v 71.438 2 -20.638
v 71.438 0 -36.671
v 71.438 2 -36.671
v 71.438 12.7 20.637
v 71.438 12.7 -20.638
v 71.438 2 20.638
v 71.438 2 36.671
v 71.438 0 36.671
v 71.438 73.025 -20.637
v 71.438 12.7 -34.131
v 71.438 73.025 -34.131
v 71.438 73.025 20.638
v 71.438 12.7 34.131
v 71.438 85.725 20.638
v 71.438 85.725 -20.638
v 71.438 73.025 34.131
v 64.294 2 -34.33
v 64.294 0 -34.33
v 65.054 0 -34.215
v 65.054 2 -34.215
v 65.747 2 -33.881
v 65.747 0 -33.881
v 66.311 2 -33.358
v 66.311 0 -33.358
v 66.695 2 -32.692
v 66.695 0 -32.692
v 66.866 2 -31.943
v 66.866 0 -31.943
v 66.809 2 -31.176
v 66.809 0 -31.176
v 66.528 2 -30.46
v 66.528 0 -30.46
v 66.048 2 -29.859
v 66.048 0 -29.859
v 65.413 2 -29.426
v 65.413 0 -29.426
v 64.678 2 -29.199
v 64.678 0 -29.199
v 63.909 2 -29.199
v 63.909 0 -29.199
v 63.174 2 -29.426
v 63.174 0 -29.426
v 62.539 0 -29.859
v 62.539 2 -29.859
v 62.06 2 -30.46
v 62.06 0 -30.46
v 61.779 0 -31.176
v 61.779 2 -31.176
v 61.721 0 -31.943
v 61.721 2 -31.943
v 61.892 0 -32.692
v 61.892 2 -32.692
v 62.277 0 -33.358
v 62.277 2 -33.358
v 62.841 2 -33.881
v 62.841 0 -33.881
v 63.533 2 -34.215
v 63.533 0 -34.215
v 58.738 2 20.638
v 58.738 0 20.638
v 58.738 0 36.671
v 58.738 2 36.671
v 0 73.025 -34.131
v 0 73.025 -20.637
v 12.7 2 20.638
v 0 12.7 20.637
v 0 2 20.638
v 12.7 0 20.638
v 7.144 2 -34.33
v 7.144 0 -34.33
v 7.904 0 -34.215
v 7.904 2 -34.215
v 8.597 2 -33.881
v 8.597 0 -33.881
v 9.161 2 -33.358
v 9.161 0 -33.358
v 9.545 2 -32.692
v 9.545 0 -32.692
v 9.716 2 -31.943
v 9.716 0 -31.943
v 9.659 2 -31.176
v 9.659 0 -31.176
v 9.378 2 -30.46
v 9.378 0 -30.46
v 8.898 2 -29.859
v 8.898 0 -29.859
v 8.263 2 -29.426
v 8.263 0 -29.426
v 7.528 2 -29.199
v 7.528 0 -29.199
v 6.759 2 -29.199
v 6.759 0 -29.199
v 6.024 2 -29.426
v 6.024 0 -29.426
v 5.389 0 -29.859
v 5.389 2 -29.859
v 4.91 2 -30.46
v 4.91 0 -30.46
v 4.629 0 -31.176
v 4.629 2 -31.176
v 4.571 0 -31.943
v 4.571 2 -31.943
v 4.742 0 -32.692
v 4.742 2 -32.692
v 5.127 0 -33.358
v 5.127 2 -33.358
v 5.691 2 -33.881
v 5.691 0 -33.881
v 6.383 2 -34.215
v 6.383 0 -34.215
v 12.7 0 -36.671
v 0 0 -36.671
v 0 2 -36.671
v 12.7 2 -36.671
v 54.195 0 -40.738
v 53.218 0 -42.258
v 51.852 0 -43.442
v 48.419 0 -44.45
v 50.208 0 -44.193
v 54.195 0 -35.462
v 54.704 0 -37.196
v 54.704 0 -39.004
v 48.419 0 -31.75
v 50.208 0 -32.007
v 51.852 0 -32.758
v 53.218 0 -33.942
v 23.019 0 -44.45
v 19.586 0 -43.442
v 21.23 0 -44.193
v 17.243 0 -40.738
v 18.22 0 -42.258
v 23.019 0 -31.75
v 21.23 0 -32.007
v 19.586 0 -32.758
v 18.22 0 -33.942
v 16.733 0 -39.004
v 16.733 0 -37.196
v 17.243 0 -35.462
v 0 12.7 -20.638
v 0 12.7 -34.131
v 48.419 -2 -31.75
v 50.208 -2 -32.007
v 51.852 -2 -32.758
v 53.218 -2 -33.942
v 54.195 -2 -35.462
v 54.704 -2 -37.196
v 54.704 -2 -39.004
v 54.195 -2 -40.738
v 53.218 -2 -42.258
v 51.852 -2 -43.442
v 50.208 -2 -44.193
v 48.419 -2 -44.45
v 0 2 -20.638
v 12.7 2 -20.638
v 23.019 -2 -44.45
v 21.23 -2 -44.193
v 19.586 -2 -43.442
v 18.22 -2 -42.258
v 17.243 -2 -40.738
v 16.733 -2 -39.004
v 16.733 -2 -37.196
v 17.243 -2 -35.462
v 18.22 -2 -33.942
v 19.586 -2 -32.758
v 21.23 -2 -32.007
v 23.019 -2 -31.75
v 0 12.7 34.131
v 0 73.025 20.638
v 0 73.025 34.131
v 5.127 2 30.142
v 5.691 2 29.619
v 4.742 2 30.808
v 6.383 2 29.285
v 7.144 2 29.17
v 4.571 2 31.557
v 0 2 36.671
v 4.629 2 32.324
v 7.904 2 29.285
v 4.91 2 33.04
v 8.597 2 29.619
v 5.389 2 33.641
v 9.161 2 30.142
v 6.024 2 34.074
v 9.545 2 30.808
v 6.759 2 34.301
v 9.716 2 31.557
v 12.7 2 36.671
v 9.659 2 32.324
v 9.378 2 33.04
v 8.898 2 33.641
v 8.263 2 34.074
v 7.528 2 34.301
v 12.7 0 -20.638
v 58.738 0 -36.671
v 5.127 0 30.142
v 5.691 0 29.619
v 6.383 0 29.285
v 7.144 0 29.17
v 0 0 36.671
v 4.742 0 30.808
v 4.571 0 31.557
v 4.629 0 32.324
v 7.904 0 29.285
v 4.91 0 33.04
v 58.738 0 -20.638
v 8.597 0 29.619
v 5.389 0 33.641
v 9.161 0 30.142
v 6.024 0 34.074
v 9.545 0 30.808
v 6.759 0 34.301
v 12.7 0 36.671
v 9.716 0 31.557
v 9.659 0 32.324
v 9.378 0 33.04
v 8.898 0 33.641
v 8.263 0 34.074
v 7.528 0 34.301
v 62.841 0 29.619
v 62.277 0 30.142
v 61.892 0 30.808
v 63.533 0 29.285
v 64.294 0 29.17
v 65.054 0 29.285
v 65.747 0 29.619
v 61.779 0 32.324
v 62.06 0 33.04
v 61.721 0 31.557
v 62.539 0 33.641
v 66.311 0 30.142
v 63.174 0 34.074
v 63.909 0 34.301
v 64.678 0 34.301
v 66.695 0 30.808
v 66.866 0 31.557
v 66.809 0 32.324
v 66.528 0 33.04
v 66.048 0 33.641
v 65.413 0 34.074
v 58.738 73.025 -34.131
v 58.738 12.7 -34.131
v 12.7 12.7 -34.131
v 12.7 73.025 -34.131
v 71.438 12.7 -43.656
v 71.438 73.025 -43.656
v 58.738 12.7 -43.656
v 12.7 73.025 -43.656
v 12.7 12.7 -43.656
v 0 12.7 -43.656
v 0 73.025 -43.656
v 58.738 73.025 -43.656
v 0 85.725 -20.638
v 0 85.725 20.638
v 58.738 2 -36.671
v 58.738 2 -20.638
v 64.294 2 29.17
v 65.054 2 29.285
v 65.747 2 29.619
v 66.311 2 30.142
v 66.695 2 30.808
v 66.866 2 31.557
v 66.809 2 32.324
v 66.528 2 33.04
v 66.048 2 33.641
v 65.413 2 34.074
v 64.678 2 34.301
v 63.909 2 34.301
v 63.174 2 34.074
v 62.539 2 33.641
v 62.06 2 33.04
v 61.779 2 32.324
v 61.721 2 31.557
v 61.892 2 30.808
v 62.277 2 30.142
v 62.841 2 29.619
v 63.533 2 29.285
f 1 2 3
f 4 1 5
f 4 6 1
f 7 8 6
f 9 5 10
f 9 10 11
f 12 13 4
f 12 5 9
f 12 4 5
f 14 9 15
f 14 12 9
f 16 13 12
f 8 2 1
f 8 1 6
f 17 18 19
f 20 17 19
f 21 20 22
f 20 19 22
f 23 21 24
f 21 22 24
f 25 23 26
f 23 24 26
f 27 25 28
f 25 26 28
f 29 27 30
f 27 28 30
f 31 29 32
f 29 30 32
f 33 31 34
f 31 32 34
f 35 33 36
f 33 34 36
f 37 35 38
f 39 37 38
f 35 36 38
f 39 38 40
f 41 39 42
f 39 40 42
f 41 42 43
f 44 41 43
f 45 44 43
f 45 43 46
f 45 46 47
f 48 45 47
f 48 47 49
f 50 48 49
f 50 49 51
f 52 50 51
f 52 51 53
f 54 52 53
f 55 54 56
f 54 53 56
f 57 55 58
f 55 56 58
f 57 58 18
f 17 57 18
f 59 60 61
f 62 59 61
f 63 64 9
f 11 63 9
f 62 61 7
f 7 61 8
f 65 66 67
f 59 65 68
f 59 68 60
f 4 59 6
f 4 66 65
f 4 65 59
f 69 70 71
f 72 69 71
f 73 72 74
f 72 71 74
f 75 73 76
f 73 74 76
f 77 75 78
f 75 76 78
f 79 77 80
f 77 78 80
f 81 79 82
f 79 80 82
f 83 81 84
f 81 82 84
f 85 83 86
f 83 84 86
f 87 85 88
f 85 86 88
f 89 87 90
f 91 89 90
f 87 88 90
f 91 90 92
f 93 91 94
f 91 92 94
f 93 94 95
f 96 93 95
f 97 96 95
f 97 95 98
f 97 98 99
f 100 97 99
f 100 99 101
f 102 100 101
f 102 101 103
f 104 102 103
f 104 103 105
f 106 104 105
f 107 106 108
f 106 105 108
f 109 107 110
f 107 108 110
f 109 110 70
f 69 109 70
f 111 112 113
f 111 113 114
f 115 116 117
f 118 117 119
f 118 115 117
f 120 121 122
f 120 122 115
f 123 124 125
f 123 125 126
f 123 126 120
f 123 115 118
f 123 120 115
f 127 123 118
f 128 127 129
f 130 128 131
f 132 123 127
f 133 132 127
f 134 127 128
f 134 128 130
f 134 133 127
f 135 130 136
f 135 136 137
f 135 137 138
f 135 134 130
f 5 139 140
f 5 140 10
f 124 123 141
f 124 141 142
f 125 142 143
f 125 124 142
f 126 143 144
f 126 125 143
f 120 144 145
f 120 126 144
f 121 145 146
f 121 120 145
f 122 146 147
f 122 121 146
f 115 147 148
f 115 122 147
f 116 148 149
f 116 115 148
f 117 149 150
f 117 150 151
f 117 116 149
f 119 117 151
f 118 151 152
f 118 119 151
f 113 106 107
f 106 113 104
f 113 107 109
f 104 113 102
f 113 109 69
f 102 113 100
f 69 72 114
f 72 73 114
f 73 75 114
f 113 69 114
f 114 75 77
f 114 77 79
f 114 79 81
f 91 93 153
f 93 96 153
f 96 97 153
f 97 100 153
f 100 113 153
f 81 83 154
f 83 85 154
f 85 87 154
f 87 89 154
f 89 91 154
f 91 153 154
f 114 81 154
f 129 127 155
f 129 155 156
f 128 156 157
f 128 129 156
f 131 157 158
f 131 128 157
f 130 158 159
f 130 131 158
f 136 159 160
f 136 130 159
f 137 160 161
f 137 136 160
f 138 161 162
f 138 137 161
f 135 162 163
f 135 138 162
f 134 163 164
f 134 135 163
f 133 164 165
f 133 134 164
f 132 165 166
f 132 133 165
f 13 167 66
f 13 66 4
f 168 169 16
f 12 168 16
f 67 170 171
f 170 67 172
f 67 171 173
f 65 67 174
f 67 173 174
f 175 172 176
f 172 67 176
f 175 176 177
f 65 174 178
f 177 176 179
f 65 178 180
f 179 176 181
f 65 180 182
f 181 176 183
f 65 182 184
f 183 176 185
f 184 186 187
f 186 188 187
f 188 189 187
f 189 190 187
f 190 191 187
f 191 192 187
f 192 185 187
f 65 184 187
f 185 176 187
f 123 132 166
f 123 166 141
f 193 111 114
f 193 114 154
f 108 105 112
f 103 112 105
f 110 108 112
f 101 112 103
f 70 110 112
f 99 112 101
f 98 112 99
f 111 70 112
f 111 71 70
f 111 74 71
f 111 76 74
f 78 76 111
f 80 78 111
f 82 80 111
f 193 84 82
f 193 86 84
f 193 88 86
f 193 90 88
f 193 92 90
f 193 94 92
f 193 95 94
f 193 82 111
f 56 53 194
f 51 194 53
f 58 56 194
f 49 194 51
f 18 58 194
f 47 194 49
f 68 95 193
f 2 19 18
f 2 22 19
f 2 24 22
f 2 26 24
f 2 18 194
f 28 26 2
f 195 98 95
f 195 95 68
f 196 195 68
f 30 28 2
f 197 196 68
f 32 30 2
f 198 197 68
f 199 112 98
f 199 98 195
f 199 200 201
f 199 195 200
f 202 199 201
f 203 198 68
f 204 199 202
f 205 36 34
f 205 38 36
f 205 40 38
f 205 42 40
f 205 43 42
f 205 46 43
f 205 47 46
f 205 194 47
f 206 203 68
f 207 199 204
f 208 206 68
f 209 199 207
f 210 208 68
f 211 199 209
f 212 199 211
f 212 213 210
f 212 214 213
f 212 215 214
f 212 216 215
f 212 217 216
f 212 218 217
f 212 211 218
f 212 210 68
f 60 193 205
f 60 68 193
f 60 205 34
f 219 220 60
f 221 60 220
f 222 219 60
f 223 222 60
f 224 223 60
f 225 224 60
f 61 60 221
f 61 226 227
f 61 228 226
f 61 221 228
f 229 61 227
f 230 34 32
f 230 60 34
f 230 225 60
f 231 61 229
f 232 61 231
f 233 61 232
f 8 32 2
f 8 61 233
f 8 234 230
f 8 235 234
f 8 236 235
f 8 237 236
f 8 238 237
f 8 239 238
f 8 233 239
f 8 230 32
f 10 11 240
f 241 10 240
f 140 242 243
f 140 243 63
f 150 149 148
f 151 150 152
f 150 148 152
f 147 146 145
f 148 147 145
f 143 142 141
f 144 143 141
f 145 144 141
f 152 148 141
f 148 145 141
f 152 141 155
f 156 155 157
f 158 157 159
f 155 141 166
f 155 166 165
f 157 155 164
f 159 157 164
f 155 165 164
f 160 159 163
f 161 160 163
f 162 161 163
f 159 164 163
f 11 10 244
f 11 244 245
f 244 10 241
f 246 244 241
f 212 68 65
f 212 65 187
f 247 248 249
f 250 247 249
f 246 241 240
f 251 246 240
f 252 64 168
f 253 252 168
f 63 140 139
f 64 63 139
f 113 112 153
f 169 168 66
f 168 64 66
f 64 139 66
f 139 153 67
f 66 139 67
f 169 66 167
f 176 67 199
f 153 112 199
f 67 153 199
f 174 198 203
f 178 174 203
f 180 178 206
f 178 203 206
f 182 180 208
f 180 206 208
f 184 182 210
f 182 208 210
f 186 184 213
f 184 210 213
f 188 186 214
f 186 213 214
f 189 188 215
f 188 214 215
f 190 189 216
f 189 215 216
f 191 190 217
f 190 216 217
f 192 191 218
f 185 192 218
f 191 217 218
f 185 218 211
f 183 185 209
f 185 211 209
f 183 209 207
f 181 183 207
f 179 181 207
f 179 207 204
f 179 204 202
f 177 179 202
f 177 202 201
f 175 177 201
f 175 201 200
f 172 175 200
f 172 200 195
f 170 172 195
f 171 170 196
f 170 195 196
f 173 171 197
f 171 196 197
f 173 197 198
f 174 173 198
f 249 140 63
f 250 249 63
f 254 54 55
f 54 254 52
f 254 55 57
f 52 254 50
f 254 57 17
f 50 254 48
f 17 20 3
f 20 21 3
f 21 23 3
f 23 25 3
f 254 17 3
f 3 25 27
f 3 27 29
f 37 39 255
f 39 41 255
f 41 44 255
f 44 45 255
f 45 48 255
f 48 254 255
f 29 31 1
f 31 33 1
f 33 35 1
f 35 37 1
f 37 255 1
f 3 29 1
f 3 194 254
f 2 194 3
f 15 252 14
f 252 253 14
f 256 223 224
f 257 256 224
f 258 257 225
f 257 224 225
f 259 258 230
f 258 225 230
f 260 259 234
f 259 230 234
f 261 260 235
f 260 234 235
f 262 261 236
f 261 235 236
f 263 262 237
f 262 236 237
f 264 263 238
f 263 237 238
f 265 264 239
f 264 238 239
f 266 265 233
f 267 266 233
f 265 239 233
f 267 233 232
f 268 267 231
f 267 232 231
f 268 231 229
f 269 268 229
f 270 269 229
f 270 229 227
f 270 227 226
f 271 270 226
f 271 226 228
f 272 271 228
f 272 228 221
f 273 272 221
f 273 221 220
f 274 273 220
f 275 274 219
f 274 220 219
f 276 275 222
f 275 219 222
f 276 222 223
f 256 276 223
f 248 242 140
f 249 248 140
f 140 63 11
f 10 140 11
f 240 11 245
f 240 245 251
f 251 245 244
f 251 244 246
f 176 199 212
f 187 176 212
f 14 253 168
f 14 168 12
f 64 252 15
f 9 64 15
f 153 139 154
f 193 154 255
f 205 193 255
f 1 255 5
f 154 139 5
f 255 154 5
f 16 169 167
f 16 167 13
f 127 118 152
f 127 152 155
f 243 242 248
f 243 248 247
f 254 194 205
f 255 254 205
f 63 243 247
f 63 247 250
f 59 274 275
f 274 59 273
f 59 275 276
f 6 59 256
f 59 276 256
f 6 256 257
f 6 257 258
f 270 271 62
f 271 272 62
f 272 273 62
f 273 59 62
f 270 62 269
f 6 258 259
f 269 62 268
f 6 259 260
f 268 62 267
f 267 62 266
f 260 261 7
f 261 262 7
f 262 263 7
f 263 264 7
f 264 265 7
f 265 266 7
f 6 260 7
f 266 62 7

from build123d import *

# Parameters (mm, degrees)
SKETCH2_W             = 71.4375
SKETCH2_H             = 85.725
BOSS_EXTRUDE1_DEPTH   = 20.6375
SKETCH3_W             = 71.4375
SKETCH3_H             = 60.325
BOSS_EXTRUDE2_DEPTH   = 34.13125
SKETCH4_W             = 12.7
SKETCH4_H             = 16.03375
BOSS_EXTRUDE3_DEPTH   = 2
SKETCH5_W             = 12.7
SKETCH5_H             = 60.325
BOSS_EXTRUDE4_DEPTH   = 9.525
BOSS_EXTRUDE4_2_DEPTH = 9.525
SKETCH6_R             = 2.5796875
CUT_EXTRUDE1_DEPTH    = 2
BOSS_EXTRUDE5_DEPTH   = 2


with BuildPart() as part:
    # Sketch2 → Boss-Extrude1 (new, symmetric)
    with BuildSketch(Plane.XY):
        with Locations((35.71875, 42.8625)):
            Rectangle(SKETCH2_W, SKETCH2_H)
    extrude(amount=BOSS_EXTRUDE1_DEPTH, both=True)

    # Sketch3 → Boss-Extrude2 (add, symmetric)
    with BuildSketch(Plane.XY):
        with Locations((35.71875, 42.8625)):
            Rectangle(SKETCH3_W, SKETCH3_H)
    extrude(amount=BOSS_EXTRUDE2_DEPTH, both=True)

    # Sketch4 → Boss-Extrude3 (add)
    with BuildSketch(Plane.XZ):
        with Locations((6.35, 28.654375)):
            Rectangle(SKETCH4_W, SKETCH4_H)
        with Locations((65.0875, 28.654375)):
            Rectangle(SKETCH4_W, SKETCH4_H)
        with Locations((65.0875, -28.654375)):
            Rectangle(SKETCH4_W, SKETCH4_H)
        with Locations((6.35, -28.654375)):
            Rectangle(SKETCH4_W, SKETCH4_H)
    extrude(amount=-BOSS_EXTRUDE3_DEPTH)

    # Sketch6 → Cut-Extrude1 (cut)
    with BuildSketch(Plane.XZ):
        with Locations(Location((7.14375, 31.75, 0), (0, 0, 270))):
            Circle(SKETCH6_R)
        with Locations(Location((64.29375, 31.75, 0), (0, 0, 270))):
            Circle(SKETCH6_R)
        with Locations(Location((64.29375, -31.75, 0), (0, 0, 270))):
            Circle(SKETCH6_R)
        with Locations(Location((7.14375, -31.75, 0), (0, 0, 270))):
            Circle(SKETCH6_R)
    extrude(amount=-CUT_EXTRUDE1_DEPTH, mode=Mode.SUBTRACT)


with BuildPart() as body_2:
    # Sketch5 → Boss-Extrude4 (new body)
    with BuildSketch(Plane(origin=(0, 0, -34.13125), x_dir=(-1, 0, 0), z_dir=(0, 0, -1))):
        with Locations((-65.0875, 42.8625)):
            Rectangle(SKETCH5_W, SKETCH5_H)
    extrude(amount=BOSS_EXTRUDE4_DEPTH)


with BuildPart() as body_3:
    # Sketch5 → Boss-Extrude4 2 (new body)
    with BuildSketch(Plane(origin=(0, 0, -34.13125), x_dir=(-1, 0, 0), z_dir=(0, 0, -1))):
        with Locations((-6.35, 42.8625)):
            Rectangle(SKETCH5_W, SKETCH5_H)
    extrude(amount=BOSS_EXTRUDE4_2_DEPTH)


with BuildPart() as body_4:
    # Sketch7 → Boss-Extrude5 (new body)
    with BuildSketch(Plane.XZ):
        with BuildLine():
            ThreePointArc((23.01875, -44.45), (16.66875, -38.1), (23.01875, -31.75))
            Line((23.01875, -31.75), (48.41875, -31.75))
            ThreePointArc((48.41875, -31.75), (54.76875, -38.1), (48.41875, -44.45))
            Line((48.41875, -44.45), (23.01875, -44.45))
        make_face()
    extrude(amount=BOSS_EXTRUDE5_DEPTH)


solid = Compound([part.part, body_2.part, body_3.part, body_4.part])
